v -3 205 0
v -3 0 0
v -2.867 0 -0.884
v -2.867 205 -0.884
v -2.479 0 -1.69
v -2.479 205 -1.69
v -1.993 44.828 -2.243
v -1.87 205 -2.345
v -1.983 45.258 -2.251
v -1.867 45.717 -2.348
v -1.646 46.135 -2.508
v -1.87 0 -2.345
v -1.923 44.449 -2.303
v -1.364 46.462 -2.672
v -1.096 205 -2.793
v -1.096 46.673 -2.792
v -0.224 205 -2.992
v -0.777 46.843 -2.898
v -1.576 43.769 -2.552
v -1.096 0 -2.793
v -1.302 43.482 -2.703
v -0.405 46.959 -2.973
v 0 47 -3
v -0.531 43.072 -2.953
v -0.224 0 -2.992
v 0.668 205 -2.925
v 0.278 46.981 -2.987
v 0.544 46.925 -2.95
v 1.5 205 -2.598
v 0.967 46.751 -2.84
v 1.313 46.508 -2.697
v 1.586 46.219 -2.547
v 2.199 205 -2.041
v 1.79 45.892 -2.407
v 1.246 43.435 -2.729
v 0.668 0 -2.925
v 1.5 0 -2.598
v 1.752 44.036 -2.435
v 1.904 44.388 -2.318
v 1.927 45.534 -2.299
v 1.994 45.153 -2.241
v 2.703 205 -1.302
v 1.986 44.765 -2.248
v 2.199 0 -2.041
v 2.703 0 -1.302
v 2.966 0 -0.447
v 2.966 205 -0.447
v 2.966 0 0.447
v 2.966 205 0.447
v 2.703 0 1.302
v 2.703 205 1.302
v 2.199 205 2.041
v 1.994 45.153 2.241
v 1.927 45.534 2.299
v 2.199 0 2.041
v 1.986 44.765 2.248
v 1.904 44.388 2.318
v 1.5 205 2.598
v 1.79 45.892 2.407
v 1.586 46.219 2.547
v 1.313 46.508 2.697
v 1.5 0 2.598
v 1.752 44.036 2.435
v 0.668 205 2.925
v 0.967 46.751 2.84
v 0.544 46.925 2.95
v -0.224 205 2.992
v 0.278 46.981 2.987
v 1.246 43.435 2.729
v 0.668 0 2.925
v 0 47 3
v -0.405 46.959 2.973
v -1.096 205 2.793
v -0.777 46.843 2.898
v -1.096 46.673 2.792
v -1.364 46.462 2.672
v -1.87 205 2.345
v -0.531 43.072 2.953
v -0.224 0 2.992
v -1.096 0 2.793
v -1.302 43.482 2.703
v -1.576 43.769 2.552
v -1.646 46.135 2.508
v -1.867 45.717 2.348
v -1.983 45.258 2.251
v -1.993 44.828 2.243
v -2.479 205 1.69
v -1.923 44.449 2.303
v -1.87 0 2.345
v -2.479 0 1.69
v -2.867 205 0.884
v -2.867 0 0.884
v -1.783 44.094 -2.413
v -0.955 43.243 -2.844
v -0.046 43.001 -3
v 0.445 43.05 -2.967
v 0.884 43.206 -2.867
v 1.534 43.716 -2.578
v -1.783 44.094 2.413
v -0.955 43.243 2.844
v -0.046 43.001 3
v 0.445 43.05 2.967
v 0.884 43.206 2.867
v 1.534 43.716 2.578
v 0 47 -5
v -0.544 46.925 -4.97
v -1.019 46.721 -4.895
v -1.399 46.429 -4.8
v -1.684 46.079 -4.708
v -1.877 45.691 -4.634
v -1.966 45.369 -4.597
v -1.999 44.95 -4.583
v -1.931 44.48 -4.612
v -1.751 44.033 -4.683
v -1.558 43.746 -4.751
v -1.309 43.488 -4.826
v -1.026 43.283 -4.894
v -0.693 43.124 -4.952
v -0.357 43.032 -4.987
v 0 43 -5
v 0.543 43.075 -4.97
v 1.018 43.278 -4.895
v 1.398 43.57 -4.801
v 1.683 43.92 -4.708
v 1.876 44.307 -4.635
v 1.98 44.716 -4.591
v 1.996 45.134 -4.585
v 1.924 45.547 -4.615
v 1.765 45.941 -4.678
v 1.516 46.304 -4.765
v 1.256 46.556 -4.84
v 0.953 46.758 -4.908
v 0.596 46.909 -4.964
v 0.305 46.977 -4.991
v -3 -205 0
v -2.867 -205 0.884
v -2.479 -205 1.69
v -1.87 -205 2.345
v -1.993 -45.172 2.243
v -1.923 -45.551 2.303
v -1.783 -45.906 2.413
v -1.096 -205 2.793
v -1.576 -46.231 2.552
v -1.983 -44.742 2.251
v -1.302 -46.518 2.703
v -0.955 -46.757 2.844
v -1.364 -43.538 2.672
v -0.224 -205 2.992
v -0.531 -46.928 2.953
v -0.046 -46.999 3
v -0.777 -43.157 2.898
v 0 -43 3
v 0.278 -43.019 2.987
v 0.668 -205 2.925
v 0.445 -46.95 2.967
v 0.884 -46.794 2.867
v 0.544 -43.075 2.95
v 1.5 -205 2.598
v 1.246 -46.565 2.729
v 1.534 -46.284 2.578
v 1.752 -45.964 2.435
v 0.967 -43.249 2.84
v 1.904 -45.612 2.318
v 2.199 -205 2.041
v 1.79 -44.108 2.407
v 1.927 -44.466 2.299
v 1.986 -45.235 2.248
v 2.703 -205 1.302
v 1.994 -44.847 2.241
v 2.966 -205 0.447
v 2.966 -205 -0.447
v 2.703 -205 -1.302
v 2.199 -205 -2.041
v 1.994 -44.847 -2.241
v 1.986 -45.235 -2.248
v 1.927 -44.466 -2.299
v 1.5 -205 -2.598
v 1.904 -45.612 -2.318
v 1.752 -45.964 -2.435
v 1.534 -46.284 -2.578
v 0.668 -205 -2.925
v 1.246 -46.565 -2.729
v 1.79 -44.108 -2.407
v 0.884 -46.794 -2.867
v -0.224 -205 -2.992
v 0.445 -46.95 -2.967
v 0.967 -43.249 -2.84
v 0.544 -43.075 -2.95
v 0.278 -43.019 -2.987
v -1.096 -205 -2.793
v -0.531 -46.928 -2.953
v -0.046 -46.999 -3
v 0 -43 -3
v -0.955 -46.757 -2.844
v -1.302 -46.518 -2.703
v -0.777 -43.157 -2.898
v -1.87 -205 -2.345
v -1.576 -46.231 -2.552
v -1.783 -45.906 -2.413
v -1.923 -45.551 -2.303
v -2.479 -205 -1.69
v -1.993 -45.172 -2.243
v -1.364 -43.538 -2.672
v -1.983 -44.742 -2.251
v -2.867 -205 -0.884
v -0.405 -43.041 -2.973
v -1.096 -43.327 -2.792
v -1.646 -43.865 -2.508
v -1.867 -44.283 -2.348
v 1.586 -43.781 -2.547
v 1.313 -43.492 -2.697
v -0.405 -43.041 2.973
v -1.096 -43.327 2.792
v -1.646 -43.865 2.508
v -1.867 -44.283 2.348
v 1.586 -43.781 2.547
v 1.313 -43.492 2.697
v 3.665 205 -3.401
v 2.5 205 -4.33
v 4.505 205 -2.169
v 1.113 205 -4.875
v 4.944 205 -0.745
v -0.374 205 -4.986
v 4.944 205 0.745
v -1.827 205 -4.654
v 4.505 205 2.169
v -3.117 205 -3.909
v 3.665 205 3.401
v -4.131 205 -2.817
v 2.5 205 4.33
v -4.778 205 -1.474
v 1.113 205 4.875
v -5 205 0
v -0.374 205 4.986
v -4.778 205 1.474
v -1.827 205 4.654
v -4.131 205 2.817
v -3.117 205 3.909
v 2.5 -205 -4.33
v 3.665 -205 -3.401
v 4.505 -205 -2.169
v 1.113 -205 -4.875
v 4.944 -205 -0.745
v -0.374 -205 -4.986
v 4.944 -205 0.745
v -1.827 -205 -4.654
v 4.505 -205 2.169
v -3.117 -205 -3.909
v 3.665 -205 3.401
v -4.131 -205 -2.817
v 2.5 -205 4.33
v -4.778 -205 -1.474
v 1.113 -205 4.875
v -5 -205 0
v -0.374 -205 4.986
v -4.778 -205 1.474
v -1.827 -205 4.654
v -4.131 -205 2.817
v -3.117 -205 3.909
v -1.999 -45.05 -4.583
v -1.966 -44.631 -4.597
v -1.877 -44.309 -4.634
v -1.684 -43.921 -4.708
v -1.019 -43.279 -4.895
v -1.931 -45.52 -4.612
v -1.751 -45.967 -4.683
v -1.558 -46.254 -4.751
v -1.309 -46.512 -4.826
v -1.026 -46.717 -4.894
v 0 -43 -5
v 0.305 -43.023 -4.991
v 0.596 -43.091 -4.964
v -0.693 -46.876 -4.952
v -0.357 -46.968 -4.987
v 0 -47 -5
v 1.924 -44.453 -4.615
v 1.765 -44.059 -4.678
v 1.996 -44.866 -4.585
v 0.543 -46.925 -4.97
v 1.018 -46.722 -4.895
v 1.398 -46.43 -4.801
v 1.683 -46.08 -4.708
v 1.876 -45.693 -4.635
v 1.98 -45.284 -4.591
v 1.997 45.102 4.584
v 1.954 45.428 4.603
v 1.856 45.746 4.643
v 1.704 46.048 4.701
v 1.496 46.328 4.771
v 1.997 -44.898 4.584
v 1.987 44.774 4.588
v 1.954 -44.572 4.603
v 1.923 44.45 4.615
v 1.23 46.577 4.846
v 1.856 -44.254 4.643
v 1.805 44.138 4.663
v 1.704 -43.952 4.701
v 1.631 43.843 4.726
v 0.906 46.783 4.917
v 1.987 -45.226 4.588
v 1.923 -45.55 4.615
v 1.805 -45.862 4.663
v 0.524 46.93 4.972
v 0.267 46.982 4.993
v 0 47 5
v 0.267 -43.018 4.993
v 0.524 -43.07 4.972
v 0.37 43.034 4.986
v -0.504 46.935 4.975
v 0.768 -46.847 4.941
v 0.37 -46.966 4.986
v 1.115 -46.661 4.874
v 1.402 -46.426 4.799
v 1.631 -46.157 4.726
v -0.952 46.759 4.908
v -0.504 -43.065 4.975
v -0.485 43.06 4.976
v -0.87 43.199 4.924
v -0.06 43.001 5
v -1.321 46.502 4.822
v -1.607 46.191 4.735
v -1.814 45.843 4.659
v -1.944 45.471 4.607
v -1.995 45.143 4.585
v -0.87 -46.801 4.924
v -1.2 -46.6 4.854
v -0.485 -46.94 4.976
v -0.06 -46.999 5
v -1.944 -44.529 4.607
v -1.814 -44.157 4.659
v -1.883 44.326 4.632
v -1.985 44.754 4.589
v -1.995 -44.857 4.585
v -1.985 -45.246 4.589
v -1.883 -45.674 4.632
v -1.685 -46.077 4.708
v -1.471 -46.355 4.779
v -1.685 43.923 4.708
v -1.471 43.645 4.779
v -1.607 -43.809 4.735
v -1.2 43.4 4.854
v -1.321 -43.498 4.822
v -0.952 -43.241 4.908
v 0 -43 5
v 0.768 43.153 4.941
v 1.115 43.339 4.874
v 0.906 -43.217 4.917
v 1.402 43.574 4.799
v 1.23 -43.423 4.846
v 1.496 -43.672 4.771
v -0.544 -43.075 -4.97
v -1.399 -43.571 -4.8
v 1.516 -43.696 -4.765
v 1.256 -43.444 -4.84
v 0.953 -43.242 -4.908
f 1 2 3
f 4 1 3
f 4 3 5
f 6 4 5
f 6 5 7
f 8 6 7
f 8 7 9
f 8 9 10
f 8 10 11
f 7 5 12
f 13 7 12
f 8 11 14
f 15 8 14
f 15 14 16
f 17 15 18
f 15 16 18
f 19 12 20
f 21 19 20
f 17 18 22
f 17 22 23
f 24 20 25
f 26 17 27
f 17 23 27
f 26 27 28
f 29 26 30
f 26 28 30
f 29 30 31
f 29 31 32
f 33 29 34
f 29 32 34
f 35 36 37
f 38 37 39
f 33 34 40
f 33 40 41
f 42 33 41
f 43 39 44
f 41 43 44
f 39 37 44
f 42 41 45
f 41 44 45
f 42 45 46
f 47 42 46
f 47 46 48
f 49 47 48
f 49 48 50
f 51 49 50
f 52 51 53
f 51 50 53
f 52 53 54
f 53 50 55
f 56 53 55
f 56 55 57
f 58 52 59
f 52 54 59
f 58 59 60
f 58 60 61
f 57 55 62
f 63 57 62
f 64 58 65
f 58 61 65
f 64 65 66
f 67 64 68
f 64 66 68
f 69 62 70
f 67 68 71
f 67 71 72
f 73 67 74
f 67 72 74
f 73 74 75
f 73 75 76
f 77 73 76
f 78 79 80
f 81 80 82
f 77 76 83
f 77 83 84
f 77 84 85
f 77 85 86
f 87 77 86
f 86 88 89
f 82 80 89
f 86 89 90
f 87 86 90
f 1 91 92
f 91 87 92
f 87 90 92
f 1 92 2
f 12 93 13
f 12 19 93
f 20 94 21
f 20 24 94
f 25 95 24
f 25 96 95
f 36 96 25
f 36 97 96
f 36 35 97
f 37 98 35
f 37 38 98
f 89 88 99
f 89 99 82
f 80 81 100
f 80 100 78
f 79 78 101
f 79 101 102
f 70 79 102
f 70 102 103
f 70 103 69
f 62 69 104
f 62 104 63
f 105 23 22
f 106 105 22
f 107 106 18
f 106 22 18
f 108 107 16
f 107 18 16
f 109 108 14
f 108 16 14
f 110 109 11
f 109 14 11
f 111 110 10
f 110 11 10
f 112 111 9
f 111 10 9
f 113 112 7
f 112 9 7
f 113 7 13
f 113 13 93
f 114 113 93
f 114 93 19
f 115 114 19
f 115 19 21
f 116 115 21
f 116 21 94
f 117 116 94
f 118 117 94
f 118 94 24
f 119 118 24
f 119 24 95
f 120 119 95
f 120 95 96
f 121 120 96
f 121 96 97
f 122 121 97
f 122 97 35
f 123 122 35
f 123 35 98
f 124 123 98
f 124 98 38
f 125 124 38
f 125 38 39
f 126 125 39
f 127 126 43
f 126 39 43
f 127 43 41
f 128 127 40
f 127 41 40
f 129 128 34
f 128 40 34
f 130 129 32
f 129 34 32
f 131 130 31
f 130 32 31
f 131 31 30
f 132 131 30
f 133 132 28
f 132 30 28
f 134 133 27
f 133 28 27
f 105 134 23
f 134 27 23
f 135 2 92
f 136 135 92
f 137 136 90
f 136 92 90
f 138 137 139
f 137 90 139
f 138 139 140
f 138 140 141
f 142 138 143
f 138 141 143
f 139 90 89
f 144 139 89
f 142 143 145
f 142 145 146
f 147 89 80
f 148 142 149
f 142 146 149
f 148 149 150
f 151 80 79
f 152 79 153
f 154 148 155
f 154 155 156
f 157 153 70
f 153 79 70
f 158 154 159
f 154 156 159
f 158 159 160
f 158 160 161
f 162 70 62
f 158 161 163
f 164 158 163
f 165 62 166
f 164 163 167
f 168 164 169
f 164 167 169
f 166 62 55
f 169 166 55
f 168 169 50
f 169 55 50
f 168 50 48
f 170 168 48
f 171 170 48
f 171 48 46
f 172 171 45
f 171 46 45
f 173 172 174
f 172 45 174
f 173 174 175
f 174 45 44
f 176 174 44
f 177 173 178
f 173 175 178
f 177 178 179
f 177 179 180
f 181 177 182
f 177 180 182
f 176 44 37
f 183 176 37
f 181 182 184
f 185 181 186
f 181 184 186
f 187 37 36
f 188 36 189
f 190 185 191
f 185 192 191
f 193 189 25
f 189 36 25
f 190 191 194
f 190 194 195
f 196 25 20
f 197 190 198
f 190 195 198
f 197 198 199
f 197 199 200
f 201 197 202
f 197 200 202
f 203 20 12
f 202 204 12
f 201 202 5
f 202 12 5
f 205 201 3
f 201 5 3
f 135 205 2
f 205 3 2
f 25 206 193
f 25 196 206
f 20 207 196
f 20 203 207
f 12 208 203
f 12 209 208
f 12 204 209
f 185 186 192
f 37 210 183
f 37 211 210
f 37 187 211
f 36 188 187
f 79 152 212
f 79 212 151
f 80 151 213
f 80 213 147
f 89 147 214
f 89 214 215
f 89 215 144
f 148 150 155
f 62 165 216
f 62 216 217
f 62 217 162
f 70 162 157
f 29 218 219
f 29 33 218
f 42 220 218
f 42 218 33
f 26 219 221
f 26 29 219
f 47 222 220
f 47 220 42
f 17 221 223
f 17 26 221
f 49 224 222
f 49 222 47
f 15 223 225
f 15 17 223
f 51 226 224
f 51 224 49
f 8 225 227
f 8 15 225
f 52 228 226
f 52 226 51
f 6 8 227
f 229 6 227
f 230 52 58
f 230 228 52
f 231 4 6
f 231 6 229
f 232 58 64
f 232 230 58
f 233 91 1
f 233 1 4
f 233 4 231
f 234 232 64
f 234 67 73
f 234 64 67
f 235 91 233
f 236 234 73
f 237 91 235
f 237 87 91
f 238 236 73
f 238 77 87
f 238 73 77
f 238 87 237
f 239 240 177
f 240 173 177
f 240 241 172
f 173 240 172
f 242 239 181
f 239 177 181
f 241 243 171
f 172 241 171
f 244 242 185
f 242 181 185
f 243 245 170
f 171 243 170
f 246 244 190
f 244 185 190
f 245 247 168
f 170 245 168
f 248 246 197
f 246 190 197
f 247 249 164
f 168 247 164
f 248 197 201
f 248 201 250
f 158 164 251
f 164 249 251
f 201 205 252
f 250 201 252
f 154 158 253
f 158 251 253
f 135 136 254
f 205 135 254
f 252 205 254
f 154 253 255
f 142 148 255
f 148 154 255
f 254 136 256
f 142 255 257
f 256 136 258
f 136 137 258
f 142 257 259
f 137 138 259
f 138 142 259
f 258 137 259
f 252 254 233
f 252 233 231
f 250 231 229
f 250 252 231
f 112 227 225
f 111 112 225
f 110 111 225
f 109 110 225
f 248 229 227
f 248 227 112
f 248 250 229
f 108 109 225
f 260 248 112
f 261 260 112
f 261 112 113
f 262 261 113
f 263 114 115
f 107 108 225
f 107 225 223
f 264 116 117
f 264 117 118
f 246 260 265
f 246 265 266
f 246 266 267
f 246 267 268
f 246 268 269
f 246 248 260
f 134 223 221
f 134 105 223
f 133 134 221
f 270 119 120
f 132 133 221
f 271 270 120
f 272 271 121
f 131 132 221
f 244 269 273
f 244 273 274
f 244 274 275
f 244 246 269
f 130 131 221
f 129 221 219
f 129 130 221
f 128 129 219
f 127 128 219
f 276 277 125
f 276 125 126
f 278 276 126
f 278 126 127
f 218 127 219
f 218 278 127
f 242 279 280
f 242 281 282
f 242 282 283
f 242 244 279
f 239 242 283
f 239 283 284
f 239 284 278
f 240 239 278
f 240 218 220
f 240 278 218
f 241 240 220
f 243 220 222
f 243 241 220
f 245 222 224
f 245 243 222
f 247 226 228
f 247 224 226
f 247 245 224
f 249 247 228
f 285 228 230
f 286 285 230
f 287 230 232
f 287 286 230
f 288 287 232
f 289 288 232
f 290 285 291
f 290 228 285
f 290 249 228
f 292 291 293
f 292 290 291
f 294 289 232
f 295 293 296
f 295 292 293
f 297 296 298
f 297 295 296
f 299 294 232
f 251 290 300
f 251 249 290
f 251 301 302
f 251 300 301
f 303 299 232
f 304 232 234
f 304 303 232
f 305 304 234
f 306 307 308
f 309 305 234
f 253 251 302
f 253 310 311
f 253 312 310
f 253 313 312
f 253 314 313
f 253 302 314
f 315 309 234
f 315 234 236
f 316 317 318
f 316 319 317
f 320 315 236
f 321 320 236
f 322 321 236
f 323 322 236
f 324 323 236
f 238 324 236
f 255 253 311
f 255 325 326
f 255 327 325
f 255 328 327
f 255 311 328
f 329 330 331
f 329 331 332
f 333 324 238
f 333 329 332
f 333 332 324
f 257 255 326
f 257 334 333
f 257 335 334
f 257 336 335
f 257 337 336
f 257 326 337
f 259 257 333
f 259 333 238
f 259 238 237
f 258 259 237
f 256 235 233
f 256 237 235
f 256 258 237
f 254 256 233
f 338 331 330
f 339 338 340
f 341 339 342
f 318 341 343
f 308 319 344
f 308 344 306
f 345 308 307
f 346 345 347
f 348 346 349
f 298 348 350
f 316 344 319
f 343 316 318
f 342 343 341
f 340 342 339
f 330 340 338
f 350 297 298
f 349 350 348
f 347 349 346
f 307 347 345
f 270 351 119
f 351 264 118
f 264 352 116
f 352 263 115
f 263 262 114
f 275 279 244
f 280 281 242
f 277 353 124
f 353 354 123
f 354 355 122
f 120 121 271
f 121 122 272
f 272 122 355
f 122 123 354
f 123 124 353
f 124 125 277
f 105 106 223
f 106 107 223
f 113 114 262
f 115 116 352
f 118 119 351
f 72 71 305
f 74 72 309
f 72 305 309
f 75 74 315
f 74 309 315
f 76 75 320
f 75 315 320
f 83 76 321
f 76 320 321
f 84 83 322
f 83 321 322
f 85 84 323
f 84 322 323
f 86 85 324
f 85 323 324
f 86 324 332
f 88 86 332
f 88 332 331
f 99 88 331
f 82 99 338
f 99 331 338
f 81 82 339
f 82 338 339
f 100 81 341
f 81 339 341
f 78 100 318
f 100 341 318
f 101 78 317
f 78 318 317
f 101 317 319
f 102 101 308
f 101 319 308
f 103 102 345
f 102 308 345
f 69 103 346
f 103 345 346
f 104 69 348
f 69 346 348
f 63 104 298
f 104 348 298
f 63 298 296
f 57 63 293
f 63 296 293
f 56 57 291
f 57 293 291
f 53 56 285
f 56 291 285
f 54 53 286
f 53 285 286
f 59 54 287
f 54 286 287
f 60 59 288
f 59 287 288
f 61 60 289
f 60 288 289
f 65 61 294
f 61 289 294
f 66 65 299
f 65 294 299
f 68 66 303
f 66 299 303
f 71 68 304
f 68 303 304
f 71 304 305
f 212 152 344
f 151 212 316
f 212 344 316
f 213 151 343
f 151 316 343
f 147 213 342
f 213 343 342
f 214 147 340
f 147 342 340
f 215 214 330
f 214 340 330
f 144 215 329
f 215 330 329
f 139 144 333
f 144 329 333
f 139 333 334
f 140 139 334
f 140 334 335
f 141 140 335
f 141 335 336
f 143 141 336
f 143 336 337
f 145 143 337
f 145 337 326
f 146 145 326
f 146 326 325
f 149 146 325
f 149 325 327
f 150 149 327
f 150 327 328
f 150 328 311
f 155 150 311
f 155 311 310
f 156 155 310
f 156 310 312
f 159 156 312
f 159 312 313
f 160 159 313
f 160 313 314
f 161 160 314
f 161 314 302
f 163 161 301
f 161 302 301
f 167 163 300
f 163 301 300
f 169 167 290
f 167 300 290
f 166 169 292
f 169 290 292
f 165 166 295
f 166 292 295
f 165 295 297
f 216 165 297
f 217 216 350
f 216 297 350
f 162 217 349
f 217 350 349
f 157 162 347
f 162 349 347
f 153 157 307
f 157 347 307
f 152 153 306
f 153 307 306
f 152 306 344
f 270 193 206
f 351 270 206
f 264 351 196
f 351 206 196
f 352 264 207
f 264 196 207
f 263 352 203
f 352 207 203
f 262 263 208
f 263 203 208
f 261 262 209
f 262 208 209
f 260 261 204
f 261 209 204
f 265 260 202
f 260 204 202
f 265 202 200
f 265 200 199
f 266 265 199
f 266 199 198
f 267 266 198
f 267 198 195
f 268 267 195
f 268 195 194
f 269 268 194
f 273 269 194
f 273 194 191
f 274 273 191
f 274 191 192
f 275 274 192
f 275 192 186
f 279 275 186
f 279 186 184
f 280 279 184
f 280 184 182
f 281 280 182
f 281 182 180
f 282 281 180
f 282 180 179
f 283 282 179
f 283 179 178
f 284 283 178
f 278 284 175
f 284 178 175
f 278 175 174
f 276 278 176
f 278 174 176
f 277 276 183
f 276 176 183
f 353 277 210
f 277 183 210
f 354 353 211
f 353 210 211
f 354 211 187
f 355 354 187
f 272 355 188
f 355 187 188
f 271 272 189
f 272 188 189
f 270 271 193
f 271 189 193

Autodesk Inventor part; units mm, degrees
ref_plane "YZ Plane" through (0, 0, 0) normal (1, 0, 0) x (0, 1, 0)
ref_plane "XZ Plane" through (0, 0, 0) normal (0, 1, 0) x (-1, 0, 0)
ref_plane "XY Plane" through (0, 0, 0) normal (0, 0, 1) x (1, 0, 0)
sketch "Skizze1" plane through (0, 0, 0) normal (0, 1, 0) x (-1, 0, 0)
  circle A0 centre (0, 0) radius 5
  circle A1 centre (0, 0) radius 3
  dimension "d0" = 2
  dimension "d2" = 10
  dimension "d20" = 6
extrude "Extrusion1" add sketch "Skizze1" along normal mid plane 410
ref_plane "Arbeitsebene2" through (0, 0, -5) normal (0, 0, 1) x (1, 0, 0)
ref_plane "Arbeitsebene1" through (-8, 108.509, 24.4581) normal (0, 0, 1) x (0, -1, 0)
sketch "Skizze3" plane through (0, 0, -5) normal (0, 0, 1) x (1, 0, 0)
  line L0 (0, 0) -> (0, 160.2649) construction
  point P0 (0, 0)
  point P1 (0, 80.1325)
  point P2 (0, 45)
  point P3 (0, -45)
  dimension "d8" = 45
  dimension "d10" = 45
hole "Bohrung1" at (0, 45, -5) at (0, -45, -5) direction (0, 0, 1) diameter 4 end through all
ref_plane "Arbeitsebene4" through (0, 0, 5) normal (0, 0, 1) x (1, 0, 0)
thread "Gewinde1" size "M7x1" class "6H" standard "ANSI Metric M Profile" length 10
thread "Gewinde2" size "M7x1" class "6H" standard "ANSI Metric M Profile" length 10
properties part number "Zwischenstange" material "Aluminium"
